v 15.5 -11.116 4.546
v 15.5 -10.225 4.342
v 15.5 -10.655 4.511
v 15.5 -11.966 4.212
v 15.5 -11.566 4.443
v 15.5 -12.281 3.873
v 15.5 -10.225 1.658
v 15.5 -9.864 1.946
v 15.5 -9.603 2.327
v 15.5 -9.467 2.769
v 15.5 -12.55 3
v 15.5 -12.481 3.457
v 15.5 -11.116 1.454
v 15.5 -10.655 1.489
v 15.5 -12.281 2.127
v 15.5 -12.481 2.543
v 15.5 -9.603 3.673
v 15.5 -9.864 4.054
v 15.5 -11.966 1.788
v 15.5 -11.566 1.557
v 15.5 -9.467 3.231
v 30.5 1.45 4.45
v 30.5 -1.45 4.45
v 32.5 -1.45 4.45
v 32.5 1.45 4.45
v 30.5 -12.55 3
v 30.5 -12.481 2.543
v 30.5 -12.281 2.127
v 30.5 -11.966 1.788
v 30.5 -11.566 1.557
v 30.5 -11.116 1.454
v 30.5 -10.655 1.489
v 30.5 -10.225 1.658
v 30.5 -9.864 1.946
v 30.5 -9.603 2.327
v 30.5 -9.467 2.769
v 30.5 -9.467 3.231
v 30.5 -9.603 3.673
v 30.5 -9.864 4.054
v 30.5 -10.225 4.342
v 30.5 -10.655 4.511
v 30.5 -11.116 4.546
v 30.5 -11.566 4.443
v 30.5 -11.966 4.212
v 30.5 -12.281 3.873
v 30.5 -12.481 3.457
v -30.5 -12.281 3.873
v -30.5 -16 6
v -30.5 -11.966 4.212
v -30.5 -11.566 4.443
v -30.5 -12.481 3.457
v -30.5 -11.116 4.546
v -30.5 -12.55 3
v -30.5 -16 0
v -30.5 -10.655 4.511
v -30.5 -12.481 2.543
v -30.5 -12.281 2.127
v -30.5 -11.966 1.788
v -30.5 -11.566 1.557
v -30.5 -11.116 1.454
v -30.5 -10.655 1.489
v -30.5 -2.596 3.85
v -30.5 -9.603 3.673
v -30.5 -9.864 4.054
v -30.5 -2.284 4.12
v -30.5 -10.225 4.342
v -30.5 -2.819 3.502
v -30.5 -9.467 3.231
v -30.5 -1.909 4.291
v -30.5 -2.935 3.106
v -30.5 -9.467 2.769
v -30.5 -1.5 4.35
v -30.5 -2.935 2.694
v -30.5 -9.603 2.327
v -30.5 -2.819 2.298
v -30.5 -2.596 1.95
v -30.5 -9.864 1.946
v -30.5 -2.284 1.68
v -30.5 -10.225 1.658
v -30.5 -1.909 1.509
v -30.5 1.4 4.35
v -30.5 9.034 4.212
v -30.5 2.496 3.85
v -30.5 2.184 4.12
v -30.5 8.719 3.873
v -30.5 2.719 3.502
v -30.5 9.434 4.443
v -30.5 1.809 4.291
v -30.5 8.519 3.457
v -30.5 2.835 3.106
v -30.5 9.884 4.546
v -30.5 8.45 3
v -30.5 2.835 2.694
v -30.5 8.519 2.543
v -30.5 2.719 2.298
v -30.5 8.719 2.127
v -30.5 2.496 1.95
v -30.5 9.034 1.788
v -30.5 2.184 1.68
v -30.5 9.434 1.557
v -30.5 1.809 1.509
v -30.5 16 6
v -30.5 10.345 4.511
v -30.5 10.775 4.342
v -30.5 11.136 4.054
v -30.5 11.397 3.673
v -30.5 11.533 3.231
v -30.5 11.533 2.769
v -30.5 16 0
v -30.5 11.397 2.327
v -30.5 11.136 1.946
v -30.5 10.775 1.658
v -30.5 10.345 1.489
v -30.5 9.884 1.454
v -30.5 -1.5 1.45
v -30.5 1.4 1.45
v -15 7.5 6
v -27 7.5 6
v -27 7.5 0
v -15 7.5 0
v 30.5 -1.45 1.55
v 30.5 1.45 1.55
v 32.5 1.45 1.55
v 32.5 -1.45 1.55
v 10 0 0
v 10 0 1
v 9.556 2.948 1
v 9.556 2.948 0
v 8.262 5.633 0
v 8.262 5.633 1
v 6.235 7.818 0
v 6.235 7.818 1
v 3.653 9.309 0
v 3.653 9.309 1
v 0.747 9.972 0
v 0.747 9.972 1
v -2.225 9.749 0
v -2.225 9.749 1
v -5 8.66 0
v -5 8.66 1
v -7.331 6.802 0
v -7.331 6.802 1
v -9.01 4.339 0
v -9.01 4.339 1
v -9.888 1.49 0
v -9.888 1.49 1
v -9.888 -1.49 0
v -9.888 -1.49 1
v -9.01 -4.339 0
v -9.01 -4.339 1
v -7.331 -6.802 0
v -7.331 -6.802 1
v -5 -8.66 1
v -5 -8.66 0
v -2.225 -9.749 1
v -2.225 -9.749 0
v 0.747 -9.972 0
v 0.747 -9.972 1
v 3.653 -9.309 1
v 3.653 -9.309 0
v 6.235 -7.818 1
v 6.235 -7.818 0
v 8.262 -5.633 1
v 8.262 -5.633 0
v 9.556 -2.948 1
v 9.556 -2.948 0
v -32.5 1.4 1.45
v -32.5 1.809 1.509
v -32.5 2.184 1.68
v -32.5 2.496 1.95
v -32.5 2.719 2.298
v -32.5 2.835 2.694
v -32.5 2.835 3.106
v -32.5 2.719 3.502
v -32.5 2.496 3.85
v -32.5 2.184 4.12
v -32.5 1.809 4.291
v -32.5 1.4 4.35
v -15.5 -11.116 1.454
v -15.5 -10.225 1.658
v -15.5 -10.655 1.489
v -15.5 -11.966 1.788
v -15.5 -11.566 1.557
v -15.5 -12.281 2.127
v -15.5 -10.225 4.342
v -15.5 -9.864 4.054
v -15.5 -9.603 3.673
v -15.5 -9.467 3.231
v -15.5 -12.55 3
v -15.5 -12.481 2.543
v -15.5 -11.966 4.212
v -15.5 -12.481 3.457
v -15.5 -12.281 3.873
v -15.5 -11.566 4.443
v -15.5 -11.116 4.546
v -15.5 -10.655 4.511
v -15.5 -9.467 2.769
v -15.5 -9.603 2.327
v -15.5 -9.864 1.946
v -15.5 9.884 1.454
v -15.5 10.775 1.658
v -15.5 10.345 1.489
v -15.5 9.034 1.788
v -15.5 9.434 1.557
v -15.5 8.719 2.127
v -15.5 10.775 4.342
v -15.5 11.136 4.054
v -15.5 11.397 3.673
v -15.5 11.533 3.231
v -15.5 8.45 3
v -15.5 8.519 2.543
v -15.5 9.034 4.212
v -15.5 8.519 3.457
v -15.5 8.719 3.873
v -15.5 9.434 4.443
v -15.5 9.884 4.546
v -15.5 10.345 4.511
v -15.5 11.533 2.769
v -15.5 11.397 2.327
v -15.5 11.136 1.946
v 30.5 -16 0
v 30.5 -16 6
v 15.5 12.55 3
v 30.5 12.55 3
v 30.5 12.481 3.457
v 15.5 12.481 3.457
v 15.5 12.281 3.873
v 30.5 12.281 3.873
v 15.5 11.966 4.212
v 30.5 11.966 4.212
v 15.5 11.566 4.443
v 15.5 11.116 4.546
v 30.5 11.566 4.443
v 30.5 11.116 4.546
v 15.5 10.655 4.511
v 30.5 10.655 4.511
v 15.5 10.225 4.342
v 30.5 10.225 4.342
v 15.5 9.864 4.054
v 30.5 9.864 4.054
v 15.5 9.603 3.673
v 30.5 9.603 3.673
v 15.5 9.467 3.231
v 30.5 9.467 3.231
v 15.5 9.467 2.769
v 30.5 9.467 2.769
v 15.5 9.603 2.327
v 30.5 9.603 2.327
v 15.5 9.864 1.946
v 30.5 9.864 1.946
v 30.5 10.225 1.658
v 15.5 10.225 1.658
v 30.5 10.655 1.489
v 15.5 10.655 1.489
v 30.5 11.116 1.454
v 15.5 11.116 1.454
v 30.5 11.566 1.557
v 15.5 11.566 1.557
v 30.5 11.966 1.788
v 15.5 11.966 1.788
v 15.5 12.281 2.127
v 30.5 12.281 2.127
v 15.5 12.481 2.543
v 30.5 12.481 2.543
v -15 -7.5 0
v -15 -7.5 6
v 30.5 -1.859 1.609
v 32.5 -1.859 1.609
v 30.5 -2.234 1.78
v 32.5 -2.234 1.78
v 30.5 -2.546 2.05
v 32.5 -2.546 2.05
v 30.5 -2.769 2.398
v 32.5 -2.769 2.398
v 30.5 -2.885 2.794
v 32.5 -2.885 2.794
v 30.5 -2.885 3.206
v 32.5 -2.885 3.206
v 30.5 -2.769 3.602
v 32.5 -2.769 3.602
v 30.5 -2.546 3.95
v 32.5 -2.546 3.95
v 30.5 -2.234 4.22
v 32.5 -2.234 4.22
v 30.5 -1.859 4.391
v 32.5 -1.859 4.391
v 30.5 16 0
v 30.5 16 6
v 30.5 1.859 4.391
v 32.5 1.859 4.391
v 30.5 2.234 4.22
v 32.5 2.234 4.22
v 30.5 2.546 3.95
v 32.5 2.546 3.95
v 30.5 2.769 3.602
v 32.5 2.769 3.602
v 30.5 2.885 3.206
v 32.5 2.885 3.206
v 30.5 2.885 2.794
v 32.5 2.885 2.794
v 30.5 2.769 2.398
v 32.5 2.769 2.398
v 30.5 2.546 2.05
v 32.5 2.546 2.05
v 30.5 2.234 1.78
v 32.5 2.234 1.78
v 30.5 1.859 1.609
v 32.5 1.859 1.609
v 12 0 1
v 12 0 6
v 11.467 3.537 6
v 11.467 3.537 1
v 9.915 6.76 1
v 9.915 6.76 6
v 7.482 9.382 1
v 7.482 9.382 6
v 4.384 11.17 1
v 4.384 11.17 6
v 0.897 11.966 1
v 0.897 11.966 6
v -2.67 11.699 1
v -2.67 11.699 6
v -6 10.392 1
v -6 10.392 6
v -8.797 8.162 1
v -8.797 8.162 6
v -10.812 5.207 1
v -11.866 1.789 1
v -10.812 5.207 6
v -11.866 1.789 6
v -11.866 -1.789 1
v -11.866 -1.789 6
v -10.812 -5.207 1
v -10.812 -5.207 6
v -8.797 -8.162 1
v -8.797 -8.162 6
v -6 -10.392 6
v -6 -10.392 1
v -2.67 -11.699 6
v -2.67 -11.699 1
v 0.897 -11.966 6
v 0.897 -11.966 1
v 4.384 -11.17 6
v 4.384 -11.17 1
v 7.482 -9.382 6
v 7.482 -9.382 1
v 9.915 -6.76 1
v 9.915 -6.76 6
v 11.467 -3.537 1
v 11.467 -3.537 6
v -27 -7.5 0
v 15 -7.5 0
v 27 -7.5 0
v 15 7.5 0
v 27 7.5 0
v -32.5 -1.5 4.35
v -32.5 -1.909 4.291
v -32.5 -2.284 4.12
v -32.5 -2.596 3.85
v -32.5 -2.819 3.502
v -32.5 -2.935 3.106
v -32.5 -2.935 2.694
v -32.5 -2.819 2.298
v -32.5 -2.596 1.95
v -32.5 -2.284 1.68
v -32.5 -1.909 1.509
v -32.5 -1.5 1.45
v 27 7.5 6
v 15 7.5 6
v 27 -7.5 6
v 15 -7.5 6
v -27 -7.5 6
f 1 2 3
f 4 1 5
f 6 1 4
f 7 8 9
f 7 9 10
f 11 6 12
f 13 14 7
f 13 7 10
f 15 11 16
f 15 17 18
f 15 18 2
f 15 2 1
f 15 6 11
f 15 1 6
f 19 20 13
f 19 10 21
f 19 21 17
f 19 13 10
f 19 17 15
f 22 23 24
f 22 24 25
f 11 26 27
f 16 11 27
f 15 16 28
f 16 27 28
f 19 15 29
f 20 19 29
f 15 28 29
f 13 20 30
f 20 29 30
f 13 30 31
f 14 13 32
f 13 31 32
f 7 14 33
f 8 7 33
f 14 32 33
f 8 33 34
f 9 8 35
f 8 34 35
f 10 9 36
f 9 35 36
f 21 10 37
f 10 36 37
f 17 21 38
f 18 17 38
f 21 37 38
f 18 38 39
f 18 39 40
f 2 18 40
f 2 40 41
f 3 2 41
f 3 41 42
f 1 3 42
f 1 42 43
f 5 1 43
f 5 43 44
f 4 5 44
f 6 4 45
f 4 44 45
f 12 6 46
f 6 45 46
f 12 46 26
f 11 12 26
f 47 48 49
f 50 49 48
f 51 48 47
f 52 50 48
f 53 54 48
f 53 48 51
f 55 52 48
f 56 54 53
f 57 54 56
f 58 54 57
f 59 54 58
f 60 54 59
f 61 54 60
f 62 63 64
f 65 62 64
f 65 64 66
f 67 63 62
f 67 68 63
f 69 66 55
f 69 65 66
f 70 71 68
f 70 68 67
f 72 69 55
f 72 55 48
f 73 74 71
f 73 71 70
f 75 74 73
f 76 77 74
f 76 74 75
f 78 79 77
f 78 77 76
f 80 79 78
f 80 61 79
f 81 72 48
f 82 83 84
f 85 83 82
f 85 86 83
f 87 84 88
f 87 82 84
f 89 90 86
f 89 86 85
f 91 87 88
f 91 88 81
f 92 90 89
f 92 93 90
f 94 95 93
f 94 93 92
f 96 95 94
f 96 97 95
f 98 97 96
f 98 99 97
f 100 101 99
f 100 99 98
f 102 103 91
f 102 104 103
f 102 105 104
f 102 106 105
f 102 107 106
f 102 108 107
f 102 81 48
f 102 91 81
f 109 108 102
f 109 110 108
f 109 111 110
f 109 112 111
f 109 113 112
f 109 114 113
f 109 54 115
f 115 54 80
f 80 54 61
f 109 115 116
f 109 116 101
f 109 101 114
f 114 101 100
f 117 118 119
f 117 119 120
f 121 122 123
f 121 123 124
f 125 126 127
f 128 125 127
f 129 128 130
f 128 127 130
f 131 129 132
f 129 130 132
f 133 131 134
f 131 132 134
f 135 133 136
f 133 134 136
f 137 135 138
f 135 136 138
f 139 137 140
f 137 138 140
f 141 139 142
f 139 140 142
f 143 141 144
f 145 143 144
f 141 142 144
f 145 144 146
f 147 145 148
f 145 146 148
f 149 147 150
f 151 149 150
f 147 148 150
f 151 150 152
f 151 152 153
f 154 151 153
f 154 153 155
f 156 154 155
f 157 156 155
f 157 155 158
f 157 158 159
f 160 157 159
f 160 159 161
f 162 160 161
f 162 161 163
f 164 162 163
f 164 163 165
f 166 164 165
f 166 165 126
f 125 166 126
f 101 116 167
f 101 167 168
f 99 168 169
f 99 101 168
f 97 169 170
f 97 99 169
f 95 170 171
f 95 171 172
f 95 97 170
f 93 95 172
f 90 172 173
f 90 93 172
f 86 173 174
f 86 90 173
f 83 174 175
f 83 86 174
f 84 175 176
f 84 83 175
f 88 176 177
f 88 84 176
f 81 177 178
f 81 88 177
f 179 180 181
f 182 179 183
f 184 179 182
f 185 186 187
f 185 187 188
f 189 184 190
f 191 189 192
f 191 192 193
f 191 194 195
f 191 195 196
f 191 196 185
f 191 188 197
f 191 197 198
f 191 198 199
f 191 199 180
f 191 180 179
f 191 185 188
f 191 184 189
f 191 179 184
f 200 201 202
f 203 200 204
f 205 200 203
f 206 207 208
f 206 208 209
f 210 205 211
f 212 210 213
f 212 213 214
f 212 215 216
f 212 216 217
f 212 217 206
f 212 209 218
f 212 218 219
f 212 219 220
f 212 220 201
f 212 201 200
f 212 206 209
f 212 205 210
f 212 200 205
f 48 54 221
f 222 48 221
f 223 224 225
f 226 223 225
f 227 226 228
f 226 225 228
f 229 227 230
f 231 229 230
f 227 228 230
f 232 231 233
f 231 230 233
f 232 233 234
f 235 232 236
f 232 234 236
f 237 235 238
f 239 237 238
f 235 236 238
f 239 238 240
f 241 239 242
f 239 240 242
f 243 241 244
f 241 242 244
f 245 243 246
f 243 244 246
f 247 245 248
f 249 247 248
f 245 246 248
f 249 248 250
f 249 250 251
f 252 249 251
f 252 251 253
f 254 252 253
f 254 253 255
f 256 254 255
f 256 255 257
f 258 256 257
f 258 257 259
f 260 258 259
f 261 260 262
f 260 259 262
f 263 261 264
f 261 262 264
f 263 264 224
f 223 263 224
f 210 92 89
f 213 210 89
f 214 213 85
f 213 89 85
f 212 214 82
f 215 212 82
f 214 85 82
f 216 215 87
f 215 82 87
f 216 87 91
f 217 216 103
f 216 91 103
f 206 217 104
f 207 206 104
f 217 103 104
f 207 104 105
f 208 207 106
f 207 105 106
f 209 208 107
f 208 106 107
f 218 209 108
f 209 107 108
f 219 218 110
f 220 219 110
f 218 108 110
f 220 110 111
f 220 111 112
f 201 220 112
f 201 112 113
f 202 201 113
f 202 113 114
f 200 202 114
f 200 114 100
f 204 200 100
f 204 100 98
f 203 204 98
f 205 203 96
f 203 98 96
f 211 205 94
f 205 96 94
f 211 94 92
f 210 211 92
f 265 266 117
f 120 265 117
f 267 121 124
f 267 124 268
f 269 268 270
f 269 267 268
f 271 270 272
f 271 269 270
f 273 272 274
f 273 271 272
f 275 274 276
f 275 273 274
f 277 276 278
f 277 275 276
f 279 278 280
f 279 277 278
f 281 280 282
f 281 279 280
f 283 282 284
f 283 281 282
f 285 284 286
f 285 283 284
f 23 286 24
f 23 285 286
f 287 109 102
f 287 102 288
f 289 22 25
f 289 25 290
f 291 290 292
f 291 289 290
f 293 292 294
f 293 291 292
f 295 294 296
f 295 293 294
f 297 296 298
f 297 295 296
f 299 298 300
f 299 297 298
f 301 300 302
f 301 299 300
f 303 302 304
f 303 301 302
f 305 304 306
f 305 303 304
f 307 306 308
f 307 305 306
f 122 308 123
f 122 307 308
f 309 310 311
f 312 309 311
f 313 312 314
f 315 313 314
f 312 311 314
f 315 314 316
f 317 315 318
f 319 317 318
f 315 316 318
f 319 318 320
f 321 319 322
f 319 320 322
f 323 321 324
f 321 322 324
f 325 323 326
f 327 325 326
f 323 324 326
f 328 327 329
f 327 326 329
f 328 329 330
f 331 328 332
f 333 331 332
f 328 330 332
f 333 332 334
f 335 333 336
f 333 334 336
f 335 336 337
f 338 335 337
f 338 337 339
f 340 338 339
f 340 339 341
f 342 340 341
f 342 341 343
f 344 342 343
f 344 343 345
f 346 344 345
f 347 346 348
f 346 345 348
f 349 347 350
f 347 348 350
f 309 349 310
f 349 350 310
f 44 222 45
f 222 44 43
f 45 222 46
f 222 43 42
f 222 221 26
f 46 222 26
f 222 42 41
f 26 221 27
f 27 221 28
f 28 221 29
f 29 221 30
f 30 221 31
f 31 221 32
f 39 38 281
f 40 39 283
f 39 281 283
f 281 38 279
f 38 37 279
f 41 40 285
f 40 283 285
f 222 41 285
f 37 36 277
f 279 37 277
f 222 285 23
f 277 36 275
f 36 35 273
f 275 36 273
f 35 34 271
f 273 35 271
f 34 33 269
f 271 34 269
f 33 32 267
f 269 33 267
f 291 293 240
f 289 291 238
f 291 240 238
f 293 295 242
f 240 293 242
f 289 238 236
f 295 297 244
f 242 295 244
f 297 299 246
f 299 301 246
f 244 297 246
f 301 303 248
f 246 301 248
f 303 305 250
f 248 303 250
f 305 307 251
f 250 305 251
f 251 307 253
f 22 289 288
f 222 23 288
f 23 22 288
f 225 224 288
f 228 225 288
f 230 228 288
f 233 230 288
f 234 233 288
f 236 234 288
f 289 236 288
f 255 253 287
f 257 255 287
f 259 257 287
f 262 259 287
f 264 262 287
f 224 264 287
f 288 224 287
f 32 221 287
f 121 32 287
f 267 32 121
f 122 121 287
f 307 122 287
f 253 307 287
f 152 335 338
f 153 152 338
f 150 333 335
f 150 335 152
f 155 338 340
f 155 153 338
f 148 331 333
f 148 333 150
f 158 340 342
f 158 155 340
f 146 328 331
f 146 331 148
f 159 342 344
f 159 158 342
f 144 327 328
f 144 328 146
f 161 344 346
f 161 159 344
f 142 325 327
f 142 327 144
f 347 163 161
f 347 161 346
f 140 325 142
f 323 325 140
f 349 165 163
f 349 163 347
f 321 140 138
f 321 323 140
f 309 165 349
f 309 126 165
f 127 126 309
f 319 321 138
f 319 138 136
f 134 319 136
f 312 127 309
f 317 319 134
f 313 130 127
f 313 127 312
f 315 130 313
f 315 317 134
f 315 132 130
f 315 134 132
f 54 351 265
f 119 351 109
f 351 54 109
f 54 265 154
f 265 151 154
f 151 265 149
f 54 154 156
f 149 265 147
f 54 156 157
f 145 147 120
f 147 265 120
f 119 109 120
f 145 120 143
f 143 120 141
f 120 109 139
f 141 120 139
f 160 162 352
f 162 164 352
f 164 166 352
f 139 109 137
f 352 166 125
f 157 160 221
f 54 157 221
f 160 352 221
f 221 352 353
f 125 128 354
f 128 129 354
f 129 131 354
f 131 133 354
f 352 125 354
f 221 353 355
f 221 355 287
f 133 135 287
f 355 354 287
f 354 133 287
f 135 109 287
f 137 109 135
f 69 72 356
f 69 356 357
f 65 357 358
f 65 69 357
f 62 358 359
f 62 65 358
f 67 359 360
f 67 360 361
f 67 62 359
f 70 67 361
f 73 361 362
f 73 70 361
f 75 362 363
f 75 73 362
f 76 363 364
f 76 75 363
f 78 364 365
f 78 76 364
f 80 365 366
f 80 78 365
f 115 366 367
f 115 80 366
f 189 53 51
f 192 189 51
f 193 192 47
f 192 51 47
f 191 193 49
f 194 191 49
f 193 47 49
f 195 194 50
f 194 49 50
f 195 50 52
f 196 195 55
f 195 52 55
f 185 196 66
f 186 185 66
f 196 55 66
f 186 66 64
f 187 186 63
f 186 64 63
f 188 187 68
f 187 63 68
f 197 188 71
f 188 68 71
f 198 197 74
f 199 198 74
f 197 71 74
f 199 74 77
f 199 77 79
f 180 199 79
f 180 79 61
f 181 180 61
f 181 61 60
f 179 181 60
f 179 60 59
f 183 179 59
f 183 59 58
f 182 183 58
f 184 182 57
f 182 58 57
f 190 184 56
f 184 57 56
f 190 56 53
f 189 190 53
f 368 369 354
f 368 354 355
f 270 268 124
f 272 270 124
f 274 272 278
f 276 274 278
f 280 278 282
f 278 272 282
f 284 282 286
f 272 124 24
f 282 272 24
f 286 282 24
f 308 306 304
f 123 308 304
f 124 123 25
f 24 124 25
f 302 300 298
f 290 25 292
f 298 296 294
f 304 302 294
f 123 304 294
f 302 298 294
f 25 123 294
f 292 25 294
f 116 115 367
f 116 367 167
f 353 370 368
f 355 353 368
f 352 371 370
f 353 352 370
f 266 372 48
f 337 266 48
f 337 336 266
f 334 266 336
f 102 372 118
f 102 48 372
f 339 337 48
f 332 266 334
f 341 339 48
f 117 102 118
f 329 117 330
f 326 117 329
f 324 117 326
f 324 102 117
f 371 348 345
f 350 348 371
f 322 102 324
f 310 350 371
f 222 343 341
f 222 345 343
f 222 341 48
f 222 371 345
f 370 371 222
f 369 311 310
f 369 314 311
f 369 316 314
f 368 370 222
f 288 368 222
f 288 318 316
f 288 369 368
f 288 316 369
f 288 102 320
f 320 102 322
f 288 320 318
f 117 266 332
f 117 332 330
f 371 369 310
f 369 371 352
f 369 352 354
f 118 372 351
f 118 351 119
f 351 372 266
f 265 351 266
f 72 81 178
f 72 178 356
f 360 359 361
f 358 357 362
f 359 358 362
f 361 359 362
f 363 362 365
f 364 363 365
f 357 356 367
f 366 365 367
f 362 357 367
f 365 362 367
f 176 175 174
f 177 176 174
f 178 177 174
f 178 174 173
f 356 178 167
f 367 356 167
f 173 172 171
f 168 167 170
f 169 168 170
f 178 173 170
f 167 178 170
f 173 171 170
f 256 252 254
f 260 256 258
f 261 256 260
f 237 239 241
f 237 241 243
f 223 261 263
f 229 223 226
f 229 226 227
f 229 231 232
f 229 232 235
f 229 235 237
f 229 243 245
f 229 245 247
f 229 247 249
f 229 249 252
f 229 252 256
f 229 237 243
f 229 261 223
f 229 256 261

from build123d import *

# Parameters (mm, degrees)
SKETCH_1_W           = 61
SKETCH_1_H           = 32
EXTRUDE_1_DEPTH      = 6
SKETCH_2_R           = 10
CUT_EXTRUDE_13_DEPTH = 6
SKETCH_4_R           = 12
CUT_EXTRUDE_14_DEPTH = 5
SKETCH_5_W           = 12
SKETCH_5_H           = 15
CUT_EXTRUDE_16_DEPTH = 6
EXTRUDE_12_DEPTH     = 2
EXTRUDE_13_DEPTH     = 2
SKETCH_10_R          = 1.55
CUT_EXTRUDE_18_DEPTH = 15
SKETCH_11_R          = 1.55
CUT_EXTRUDE_19_DEPTH = 15


with BuildPart() as part:
    # Эскиз1 → Бобышка-Вытянуть1 (new body)
    with BuildSketch(Plane.XY):
        Rectangle(SKETCH_1_W, SKETCH_1_H)
    extrude(amount=EXTRUDE_1_DEPTH)

    # Эскиз2 → Вырез-Вытянуть13 (cut)
    with BuildSketch(Plane.XY.offset(6)):
        Circle(SKETCH_2_R)
    extrude(amount=-CUT_EXTRUDE_13_DEPTH, mode=Mode.SUBTRACT)

    # Эскиз4 → Вырез-Вытянуть14 (cut)
    with BuildSketch(Plane.XY.offset(6)):
        Circle(SKETCH_4_R)
    extrude(amount=-CUT_EXTRUDE_14_DEPTH, mode=Mode.SUBTRACT)

    # Эскиз5 → Вырез-Вытянуть16 (cut)
    with BuildSketch(Plane.XY.offset(6)):
        with Locations((21, 0)):
            Rectangle(SKETCH_5_W, SKETCH_5_H)
        with Locations((-21, 0)):
            Rectangle(SKETCH_5_W, SKETCH_5_H)
    extrude(amount=-CUT_EXTRUDE_16_DEPTH, mode=Mode.SUBTRACT)

    # Эскиз8 → Бобышка-Вытянуть12 (add)
    with BuildSketch(Plane.ZY.offset(30.5)):
        with BuildLine():
            Line((1.45, -1.5), (1.45, 1.4))
            ThreePointArc((1.45, 1.4), (2.9, 2.85), (4.35, 1.4))
            Line((4.35, 1.4), (4.35, -1.5))
            ThreePointArc((4.35, -1.5), (2.9, -2.95), (1.45, -1.5))
        make_face()
    extrude(amount=EXTRUDE_12_DEPTH)

    # Эскиз9 → Бобышка-Вытянуть13 (add)
    with BuildSketch(Plane(origin=(30.5, 0, 0), x_dir=(0, 0, -1), z_dir=(1, 0, 0))):
        with BuildLine():
            Line((-1.55, 1.45), (-1.55, -1.45))
            ThreePointArc((-1.55, -1.45), (-3, -2.9), (-4.45, -1.45))
            Line((-4.45, -1.45), (-4.45, 1.45))
            ThreePointArc((-4.45, 1.45), (-3, 2.9), (-1.55, 1.45))
        make_face()
    extrude(amount=EXTRUDE_13_DEPTH)

    # Эскиз10 → Вырез-Вытянуть18 (cut)
    with BuildSketch(Plane.ZY.offset(30.5)):
        with Locations(Location((3, 10, 0), (0, 0, 270))):  # turned: the seam where the file's is
            Circle(SKETCH_10_R)
        with Locations(Location((3, -11, 0), (0, 0, 270))):  # turned: the seam where the file's is
            Circle(SKETCH_10_R)
    extrude(amount=-CUT_EXTRUDE_18_DEPTH, mode=Mode.SUBTRACT)

    # Эскиз11 → Вырез-Вытянуть19 (cut)
    with BuildSketch(Plane(origin=(30.5, 0, 0), x_dir=(0, 0, -1), z_dir=(1, 0, 0))):
        with Locations(Location((-3, 11, 0), (0, 0, 90))):  # turned: the seam where the file's is
            Circle(SKETCH_11_R)
        with Locations(Location((-3, -11, 0), (0, 0, 270))):  # turned: the seam where the file's is
            Circle(SKETCH_11_R)
    extrude(amount=-CUT_EXTRUDE_19_DEPTH, mode=Mode.SUBTRACT)


solid = part.part
